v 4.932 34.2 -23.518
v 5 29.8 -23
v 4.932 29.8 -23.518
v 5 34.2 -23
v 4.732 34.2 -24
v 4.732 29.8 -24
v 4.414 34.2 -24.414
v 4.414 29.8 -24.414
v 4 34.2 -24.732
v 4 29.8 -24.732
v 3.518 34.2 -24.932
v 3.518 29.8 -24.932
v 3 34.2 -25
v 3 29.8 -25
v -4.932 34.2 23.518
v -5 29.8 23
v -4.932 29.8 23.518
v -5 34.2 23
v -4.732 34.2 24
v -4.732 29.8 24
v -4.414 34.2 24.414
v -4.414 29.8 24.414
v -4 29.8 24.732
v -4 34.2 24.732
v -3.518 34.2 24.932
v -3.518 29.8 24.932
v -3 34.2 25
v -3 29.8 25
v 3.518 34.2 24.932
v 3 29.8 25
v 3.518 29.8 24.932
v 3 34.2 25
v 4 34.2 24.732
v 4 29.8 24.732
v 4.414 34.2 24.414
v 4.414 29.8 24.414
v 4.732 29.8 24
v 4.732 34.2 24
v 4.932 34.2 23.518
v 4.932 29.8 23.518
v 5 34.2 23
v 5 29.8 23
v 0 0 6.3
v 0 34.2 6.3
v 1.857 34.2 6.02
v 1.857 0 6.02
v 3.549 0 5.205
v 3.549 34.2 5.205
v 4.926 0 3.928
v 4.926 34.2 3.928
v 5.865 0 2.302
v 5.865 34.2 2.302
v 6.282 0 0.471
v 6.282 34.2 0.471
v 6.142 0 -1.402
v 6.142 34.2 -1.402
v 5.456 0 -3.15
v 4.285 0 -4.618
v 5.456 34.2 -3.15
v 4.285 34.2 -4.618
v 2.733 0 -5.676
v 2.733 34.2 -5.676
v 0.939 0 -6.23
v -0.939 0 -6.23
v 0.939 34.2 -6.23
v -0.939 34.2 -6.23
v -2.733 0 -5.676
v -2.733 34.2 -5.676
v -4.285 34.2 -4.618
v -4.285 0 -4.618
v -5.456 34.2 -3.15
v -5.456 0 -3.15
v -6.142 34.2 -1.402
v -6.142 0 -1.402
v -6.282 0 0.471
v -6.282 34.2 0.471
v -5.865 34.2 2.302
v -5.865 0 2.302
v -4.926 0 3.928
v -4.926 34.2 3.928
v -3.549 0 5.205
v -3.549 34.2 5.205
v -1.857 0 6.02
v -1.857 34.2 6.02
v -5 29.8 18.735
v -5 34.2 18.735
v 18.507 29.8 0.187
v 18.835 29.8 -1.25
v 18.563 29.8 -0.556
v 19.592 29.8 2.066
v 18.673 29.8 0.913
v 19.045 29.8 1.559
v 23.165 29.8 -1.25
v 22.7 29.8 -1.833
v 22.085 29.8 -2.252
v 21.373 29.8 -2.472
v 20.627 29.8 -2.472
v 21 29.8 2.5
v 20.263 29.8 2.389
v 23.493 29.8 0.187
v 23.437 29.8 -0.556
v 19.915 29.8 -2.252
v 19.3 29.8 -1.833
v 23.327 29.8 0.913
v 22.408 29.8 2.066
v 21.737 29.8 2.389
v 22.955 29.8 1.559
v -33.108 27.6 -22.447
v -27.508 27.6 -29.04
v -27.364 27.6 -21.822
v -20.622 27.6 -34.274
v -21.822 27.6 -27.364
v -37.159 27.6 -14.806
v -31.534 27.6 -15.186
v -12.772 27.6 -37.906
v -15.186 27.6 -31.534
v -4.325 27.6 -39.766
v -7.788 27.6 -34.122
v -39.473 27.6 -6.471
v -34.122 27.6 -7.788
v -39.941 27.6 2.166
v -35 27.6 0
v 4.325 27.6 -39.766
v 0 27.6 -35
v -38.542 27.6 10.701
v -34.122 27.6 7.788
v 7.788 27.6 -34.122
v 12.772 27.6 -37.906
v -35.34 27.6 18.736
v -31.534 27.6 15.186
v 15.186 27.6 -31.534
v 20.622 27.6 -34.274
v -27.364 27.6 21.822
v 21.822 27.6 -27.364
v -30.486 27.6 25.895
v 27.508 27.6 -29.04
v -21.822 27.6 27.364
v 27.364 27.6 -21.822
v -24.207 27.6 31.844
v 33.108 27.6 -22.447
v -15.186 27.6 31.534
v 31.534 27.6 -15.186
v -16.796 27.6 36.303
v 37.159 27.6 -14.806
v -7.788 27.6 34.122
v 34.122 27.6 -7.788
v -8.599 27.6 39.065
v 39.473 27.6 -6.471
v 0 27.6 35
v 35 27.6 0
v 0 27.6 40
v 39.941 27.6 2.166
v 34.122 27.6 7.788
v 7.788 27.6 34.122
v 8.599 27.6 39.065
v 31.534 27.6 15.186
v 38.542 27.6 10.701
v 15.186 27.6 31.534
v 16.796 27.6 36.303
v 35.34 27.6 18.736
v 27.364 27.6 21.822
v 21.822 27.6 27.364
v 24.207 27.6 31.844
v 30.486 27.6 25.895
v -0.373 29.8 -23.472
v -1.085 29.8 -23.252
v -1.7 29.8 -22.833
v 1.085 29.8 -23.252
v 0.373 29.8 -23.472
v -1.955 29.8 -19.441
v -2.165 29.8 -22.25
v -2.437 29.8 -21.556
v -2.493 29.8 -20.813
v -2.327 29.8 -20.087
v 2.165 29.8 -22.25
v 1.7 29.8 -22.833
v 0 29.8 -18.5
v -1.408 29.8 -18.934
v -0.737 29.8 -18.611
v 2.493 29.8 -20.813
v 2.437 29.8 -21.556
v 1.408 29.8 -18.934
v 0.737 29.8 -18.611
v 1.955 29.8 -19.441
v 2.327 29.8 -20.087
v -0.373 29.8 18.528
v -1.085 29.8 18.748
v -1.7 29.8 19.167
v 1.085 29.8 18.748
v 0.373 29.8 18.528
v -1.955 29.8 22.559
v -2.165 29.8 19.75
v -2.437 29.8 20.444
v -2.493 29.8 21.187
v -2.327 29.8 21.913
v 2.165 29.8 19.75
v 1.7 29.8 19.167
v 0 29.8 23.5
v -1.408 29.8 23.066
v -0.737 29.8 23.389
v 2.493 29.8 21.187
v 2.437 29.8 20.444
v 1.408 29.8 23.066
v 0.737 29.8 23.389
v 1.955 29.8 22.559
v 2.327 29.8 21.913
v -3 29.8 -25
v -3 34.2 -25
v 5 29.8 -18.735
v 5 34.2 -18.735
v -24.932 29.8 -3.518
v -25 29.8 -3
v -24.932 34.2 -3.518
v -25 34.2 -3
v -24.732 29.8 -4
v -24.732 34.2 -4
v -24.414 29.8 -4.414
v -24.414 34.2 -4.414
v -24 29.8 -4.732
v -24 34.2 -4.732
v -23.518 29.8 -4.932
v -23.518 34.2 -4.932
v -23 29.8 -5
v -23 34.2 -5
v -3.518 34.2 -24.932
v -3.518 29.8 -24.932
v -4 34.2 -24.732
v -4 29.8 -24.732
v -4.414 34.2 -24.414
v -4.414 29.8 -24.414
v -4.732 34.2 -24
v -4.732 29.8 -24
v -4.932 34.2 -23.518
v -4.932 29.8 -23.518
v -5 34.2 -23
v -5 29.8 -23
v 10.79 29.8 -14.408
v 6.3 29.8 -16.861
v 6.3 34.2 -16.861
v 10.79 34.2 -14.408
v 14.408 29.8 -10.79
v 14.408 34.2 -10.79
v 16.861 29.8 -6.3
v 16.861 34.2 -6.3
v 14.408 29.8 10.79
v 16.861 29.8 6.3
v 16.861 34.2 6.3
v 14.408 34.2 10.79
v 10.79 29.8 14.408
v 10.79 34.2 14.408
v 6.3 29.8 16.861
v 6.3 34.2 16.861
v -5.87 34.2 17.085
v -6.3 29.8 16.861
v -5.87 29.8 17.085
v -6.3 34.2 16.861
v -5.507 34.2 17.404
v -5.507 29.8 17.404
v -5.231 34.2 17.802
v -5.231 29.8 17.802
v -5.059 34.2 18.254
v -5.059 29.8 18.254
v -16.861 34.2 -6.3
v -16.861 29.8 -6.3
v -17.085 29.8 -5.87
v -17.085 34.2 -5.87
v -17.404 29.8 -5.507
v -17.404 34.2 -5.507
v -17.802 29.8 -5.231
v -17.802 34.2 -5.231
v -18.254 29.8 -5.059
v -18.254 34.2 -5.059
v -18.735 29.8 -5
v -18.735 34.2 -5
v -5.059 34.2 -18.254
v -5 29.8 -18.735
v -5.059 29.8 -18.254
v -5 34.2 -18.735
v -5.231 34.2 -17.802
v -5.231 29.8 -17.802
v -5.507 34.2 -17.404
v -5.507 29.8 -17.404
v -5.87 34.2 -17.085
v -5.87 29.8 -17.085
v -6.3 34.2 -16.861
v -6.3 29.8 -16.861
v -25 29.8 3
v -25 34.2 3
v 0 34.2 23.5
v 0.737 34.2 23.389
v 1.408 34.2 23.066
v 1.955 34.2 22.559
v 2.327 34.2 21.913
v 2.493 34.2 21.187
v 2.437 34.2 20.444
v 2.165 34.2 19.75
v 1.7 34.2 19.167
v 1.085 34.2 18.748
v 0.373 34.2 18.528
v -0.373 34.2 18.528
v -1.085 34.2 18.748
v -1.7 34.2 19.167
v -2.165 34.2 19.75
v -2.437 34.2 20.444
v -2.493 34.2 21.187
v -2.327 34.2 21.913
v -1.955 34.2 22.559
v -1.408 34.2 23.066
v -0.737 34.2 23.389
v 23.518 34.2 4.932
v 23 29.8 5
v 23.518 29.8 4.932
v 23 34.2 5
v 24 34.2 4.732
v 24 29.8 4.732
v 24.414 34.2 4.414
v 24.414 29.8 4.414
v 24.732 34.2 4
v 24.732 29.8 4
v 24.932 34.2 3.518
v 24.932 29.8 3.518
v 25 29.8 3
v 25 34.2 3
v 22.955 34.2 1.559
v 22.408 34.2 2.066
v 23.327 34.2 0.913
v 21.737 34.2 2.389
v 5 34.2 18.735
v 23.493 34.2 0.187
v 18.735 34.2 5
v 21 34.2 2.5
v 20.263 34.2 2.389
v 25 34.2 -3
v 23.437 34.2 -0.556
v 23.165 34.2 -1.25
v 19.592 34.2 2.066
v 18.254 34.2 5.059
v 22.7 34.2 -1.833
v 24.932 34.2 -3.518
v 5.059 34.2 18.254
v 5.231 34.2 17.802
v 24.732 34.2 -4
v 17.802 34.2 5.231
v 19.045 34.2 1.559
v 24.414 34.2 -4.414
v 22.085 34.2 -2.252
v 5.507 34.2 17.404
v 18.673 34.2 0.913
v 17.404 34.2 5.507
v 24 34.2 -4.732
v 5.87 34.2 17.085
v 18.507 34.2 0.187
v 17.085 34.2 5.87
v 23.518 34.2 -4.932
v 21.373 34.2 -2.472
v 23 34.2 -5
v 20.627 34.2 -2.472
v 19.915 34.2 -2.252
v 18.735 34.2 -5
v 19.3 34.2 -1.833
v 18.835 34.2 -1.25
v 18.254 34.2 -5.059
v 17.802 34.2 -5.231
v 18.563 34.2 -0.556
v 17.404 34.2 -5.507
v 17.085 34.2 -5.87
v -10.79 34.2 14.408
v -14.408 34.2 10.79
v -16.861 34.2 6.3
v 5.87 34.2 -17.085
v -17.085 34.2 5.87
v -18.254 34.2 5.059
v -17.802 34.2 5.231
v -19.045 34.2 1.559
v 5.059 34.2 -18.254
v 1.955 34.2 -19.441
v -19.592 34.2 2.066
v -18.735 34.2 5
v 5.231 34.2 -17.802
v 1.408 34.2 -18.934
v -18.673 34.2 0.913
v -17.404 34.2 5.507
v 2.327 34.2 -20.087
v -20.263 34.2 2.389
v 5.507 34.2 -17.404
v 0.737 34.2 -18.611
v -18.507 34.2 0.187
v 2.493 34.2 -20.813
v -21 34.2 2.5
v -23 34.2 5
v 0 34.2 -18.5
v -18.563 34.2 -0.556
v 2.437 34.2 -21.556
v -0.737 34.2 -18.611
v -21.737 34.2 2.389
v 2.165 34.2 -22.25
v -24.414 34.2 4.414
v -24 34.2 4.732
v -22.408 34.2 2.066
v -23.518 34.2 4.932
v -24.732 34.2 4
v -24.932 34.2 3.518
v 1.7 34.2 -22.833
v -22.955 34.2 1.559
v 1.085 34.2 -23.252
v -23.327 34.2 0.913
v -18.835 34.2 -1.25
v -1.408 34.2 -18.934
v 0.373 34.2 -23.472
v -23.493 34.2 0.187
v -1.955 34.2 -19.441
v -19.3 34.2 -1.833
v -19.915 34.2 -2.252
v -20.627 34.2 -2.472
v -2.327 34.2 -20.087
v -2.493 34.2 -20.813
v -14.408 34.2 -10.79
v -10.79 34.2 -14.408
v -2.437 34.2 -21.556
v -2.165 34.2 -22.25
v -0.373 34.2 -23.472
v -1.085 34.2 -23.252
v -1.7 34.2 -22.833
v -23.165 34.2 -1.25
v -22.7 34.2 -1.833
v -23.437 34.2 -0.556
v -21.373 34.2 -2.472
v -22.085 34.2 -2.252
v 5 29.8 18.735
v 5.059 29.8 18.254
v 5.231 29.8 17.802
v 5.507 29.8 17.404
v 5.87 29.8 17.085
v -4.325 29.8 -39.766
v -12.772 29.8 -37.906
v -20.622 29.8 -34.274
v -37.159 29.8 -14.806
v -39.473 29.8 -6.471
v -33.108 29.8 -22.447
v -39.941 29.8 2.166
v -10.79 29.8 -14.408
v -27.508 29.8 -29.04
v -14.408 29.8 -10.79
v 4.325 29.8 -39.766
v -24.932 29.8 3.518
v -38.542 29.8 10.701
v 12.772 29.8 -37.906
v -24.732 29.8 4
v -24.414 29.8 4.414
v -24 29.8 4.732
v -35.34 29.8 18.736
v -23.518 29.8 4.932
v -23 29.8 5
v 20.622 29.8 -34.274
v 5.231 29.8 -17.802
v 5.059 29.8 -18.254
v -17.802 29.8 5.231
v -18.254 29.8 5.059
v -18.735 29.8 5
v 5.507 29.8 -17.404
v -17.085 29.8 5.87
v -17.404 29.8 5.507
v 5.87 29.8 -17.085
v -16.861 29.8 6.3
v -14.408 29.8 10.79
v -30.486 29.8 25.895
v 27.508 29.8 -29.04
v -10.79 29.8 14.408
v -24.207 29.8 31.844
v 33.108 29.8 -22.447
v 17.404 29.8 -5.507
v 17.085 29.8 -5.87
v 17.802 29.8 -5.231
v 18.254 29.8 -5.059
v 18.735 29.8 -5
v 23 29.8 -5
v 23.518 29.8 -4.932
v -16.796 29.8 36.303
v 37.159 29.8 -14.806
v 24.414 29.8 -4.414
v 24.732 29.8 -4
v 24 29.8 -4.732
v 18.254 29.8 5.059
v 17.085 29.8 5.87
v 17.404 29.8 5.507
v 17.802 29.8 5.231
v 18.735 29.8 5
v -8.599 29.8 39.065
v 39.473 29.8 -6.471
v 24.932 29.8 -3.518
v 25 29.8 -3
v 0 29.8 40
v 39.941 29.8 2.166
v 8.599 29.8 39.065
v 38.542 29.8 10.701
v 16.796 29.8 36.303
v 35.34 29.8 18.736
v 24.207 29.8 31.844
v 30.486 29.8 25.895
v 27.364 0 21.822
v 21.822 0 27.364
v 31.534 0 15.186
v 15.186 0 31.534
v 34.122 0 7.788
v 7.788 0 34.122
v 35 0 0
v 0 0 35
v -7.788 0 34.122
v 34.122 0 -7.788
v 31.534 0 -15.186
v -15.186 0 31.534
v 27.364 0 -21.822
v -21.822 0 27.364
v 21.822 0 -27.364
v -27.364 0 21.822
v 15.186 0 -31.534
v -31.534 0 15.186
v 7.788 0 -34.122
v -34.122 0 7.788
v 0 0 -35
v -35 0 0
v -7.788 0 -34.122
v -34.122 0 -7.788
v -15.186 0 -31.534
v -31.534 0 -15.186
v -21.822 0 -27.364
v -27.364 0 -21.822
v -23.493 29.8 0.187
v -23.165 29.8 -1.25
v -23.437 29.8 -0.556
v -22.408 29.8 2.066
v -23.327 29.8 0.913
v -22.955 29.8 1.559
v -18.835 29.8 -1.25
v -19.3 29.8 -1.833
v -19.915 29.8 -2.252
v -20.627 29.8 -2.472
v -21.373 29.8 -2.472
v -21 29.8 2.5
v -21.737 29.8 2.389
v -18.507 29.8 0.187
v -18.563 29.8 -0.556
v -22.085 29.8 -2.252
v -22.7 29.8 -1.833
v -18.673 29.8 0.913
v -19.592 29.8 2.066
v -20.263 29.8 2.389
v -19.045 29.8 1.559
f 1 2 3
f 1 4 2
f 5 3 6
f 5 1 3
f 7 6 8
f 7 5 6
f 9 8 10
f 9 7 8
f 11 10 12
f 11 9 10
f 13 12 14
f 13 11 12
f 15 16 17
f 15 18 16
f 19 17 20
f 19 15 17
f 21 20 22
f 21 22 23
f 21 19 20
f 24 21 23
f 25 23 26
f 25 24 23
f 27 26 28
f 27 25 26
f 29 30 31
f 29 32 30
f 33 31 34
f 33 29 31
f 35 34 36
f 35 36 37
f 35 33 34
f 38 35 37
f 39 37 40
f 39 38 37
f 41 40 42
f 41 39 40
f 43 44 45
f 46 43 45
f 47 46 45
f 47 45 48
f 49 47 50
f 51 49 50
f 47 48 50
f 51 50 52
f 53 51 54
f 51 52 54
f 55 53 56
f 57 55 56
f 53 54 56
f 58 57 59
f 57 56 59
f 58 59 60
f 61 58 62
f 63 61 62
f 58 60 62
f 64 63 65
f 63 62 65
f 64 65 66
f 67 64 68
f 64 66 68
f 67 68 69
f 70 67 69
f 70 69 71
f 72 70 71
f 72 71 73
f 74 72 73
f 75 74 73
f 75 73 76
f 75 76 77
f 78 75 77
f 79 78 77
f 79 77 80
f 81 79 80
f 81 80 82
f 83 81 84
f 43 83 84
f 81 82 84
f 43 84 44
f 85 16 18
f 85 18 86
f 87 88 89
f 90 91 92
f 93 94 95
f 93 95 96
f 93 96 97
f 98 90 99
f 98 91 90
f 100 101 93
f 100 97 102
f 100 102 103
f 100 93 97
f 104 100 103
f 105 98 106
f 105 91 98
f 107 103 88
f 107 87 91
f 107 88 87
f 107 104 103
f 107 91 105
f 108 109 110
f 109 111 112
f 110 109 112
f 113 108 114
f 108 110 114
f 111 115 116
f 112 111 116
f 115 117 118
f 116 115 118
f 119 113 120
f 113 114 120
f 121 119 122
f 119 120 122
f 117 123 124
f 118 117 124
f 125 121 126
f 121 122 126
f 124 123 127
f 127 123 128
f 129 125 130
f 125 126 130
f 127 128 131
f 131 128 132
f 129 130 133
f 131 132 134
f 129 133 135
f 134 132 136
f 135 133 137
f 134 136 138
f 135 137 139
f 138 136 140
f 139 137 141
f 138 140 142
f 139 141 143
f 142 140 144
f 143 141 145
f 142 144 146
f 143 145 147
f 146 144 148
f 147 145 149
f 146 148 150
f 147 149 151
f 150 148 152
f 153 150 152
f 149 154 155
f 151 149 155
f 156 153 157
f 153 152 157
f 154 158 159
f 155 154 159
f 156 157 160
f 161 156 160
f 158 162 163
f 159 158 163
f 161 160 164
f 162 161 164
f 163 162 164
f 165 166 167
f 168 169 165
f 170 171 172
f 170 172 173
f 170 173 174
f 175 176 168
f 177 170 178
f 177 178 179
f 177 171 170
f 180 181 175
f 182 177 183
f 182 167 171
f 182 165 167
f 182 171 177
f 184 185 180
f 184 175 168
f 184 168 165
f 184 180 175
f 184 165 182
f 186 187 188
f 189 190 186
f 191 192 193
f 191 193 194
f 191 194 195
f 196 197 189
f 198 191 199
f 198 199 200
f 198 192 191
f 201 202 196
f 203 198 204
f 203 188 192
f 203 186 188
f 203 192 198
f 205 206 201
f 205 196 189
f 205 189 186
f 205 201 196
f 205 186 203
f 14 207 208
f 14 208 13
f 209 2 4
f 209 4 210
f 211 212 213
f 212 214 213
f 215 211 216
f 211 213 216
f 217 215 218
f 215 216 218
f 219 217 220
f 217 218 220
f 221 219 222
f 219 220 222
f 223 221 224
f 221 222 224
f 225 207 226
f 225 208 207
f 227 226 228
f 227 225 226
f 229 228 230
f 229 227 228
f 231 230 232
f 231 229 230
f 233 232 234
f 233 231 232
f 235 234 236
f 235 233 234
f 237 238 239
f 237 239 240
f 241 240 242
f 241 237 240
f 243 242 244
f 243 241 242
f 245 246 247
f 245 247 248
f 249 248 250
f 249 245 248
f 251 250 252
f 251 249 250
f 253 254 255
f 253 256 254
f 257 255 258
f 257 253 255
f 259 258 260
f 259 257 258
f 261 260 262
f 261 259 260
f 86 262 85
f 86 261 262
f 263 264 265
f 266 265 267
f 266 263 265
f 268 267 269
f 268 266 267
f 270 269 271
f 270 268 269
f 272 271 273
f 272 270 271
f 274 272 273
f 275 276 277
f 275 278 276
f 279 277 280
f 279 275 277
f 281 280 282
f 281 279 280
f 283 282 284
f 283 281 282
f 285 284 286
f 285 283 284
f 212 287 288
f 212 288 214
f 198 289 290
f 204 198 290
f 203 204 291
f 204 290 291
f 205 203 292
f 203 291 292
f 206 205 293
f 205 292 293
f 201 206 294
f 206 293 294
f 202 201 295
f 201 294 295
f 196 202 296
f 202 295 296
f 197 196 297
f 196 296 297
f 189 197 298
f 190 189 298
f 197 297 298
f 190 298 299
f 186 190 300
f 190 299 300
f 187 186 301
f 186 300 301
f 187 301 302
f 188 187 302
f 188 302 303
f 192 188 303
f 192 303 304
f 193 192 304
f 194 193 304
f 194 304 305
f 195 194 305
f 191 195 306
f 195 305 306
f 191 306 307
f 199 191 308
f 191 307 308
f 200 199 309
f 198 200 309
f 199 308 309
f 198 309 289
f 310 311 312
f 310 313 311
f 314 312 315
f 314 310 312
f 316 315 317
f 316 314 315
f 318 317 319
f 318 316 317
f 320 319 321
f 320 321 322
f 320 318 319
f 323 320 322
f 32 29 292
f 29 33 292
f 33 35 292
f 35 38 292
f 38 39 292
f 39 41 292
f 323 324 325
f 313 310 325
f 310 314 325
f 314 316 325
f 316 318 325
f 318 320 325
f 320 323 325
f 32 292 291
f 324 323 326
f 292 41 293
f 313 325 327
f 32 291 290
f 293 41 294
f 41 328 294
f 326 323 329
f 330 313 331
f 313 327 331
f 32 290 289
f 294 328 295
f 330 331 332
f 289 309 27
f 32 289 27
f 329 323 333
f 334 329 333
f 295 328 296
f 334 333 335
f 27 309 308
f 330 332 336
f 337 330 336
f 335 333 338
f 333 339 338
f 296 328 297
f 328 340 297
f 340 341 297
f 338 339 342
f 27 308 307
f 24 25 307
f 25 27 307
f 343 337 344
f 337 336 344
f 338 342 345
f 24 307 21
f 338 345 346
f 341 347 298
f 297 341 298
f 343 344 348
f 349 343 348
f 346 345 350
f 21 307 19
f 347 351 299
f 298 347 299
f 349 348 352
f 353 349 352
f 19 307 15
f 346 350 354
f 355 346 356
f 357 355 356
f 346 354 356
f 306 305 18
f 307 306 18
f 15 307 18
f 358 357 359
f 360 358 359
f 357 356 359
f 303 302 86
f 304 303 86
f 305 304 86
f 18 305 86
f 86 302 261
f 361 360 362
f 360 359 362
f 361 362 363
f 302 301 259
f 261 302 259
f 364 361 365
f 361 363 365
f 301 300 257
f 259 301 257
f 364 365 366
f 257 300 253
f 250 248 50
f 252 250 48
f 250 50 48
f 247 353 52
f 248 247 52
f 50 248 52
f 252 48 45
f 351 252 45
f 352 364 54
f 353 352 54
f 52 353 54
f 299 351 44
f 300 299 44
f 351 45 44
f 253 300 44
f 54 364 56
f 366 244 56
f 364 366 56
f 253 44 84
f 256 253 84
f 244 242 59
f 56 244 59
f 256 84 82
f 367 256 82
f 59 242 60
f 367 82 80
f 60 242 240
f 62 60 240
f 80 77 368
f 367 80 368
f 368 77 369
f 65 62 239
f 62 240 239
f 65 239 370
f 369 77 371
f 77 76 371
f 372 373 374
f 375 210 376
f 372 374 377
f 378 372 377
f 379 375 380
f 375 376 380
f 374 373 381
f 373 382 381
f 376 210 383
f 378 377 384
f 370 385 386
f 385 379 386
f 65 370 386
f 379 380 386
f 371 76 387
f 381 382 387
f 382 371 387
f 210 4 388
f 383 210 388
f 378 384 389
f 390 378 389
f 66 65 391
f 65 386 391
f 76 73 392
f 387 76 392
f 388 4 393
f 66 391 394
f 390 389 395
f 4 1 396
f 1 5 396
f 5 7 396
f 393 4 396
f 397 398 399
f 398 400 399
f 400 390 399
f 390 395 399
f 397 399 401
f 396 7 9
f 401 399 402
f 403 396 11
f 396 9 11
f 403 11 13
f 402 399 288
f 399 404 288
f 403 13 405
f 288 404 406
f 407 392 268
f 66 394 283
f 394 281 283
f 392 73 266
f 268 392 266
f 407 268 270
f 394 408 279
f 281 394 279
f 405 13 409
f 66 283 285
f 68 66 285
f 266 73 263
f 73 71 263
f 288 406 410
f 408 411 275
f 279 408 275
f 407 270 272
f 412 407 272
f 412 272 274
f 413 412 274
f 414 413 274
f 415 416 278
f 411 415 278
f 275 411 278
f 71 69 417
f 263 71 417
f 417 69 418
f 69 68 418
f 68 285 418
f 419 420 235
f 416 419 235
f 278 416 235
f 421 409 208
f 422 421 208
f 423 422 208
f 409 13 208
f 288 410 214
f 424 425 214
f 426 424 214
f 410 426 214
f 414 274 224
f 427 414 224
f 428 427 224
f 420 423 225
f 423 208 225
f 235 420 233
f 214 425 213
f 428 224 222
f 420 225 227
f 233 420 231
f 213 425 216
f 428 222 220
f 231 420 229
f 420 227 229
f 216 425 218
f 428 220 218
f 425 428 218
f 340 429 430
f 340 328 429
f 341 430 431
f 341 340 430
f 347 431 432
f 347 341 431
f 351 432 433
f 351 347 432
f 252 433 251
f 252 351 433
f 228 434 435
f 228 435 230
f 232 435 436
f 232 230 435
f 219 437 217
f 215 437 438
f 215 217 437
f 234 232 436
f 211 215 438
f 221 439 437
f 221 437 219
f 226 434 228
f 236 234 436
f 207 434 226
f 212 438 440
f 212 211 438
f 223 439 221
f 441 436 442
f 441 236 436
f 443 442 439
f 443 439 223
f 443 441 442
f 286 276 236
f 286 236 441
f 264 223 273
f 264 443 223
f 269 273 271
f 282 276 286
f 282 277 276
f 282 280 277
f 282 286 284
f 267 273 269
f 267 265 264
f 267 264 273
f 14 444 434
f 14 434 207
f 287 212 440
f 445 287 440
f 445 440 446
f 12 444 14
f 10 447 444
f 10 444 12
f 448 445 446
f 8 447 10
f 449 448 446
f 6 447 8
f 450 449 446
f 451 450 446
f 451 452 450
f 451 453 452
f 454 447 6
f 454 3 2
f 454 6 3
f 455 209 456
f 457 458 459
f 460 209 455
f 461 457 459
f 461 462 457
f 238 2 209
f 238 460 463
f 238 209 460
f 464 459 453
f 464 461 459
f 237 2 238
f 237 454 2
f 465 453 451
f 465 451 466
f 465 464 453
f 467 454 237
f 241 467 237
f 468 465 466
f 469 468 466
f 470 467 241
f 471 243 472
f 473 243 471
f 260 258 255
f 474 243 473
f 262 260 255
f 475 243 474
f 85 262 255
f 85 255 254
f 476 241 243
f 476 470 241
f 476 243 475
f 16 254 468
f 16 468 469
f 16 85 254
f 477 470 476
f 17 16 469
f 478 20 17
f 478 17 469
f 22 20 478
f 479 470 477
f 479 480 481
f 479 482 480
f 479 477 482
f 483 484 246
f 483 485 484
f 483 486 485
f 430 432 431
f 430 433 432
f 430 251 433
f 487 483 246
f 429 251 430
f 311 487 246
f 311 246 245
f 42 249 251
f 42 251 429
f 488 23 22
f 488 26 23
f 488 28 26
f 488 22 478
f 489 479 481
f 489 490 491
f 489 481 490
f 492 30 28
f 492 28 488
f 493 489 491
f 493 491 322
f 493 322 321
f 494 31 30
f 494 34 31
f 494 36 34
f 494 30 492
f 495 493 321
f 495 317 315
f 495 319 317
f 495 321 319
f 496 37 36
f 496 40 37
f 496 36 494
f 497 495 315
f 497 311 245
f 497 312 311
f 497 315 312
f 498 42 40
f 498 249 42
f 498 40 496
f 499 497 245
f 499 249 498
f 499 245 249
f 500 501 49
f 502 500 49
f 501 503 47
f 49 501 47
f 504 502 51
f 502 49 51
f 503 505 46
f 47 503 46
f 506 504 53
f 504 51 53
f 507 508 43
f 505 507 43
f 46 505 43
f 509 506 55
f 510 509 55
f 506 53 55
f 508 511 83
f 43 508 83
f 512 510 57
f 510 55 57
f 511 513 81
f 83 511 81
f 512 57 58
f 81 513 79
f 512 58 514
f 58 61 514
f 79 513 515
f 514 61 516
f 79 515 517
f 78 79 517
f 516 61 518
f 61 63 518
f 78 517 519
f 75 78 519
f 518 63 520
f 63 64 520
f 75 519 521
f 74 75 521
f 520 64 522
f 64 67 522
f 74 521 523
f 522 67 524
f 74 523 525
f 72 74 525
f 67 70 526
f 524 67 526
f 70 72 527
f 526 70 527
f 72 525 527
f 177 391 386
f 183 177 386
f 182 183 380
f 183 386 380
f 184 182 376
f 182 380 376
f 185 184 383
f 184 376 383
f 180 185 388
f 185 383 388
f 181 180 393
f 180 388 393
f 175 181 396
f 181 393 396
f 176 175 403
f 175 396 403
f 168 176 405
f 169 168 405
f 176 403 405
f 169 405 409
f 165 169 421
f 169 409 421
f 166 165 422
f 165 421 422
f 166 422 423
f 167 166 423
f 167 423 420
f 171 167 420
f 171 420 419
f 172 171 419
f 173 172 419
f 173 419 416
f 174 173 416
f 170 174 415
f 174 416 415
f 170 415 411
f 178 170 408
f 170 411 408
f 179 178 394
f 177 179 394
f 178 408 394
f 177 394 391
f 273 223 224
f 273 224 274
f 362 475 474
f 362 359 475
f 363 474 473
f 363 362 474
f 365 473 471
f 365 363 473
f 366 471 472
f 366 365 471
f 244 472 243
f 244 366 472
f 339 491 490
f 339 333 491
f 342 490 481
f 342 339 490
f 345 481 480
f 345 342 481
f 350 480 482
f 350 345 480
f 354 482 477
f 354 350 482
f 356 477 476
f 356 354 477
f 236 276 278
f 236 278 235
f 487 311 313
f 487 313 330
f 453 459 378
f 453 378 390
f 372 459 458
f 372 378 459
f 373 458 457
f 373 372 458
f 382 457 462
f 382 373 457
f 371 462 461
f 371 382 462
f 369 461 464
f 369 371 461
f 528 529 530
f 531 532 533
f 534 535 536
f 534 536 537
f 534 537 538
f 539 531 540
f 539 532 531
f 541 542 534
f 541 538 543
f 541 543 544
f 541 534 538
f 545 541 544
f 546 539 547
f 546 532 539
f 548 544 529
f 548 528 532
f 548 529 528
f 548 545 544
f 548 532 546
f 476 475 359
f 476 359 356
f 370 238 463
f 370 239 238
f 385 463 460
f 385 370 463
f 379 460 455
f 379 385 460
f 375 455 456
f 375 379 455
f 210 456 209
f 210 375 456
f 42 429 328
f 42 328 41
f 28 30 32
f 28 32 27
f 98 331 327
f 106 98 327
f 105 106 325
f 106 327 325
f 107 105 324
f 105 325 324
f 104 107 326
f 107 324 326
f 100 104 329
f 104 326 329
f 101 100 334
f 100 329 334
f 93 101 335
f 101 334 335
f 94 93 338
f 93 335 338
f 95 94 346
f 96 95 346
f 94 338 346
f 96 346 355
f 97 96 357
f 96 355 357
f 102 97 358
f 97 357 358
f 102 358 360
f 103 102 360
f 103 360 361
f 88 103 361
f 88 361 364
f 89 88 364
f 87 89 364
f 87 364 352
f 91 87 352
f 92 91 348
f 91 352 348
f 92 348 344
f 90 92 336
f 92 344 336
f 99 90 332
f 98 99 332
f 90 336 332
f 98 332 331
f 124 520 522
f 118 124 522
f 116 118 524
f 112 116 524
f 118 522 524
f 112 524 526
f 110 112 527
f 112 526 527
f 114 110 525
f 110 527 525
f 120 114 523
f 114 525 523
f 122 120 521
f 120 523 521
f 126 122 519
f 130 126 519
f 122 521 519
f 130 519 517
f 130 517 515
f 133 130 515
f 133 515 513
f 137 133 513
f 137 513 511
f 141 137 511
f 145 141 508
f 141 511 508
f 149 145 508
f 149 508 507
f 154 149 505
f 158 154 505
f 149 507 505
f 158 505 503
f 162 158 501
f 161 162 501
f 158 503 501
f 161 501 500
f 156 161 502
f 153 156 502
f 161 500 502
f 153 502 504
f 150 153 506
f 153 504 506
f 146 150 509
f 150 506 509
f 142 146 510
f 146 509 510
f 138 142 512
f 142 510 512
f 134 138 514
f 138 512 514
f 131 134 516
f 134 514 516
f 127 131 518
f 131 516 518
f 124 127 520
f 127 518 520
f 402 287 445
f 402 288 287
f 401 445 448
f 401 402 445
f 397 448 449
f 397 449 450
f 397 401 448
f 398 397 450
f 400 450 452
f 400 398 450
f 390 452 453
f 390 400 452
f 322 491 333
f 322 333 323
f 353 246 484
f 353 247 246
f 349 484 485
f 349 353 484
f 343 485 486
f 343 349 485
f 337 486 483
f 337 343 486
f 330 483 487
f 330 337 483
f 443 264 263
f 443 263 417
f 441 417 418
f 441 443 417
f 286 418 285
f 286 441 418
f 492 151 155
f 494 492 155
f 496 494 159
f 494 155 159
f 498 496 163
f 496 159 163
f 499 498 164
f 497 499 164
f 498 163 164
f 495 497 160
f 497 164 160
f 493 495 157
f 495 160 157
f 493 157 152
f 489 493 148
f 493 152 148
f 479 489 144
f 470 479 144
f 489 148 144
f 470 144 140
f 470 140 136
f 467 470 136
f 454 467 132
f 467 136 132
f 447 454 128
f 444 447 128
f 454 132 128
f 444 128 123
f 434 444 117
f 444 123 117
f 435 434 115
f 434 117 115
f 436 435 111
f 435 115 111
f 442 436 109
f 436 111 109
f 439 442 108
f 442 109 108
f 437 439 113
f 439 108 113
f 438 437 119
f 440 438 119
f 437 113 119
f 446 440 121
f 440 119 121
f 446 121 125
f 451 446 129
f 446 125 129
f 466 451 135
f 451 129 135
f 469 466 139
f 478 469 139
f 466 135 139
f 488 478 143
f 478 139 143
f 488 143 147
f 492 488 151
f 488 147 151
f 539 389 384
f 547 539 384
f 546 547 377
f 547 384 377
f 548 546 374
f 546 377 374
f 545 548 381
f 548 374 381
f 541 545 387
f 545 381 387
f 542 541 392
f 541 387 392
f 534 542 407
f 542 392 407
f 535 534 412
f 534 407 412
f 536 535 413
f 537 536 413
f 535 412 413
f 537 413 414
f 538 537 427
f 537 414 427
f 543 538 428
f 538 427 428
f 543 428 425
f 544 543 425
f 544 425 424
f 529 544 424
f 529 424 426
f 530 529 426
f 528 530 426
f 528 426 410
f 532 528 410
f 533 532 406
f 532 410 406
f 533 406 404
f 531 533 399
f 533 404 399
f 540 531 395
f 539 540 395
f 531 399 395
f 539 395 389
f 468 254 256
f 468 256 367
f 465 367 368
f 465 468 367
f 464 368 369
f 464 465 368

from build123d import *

# Parameters (mm, degrees)
SKETCH1_R           = 35
BOSS_EXTRUDE1_DEPTH = 27.6
SKETCH2_R           = 40
BOSS_EXTRUDE2_DEPTH = 2.2
BOSS_EXTRUDE3_DEPTH = 4.4
FILLET3_R           = 2
SKETCH4_R           = 6.3
CUT_EXTRUDE1_DEPTH  = 34.2
SKETCH5_R           = 2.5
CUT_EXTRUDE2_DEPTH  = 4.4


with BuildPart() as part:
    # Sketch1 → Boss-Extrude1 (new body)
    with BuildSketch(Plane(origin=(0, 0, 0), x_dir=(1, 0, 0), z_dir=(0, 1, 0))):
        with Locations(Location((0, 0, 0), (0, 0, 90))):
            Circle(SKETCH1_R)
    extrude(amount=BOSS_EXTRUDE1_DEPTH)

    # Sketch2 → Boss-Extrude2 (add)
    with BuildSketch(Plane(origin=(0, 27.6, 0), x_dir=(1, 0, 0), z_dir=(0, 1, 0))):
        with Locations(Location((0, 0, 0), (0, 0, 270))):
            Circle(SKETCH2_R)
    extrude(amount=BOSS_EXTRUDE2_DEPTH)

    # Sketch3 → Boss-Extrude3 (add)
    with BuildSketch(Plane(origin=(0, 29.8, 0), x_dir=(1, 0, 0), z_dir=(0, 1, 0))):
        with BuildLine():
            Line((-25, 5), (-17.291616466, 5))
            ThreePointArc((-17.291616466, 5), (-12.727922061, 12.727922061), (-5, 17.291616466))
            Line((-5, 17.291616466), (-5, 25))
            Line((-5, 25), (5, 25))
            Line((5, 25), (5, 17.291616466))
            ThreePointArc((5, 17.291616466), (12.727922061, 12.727922061), (17.291616466, 5))
            Line((17.291616466, 5), (25, 5))
            Line((25, 5), (25, -5))
            Line((25, -5), (17.291616466, -5))
            ThreePointArc((17.291616466, -5), (12.727922061, -12.727922061), (5, -17.291616466))
            Line((5, -17.291616466), (5, -25))
            Line((5, -25), (-5, -25))
            Line((-5, -25), (-5, -17.291616466))
            ThreePointArc((-5, -17.291616466), (-12.727922061, -12.727922061), (-17.291616466, -5))
            Line((-17.291616466, -5), (-25, -5))
            Line((-25, -5), (-25, 5))
        make_face()
    extrude(amount=BOSS_EXTRUDE3_DEPTH)

    # Fillet3
    fillet3_edges = [part.edges().sort_by_distance(p)[0] for p in [
        (-25, 32, -5),
        (-25, 32, 5),
        (-17.291616466, 32, 5),
        (-5, 32, 17.291616466),
        (-5, 32, 25),
        (5, 32, 25),
        (5, 32, 17.291616466),
        (17.291616466, 32, 5),
        (25, 32, 5),
        (25, 32, -5),
        (17.291616466, 32, -5),
        (5, 32, -17.291616466),
        (5, 32, -25),
        (-5, 32, -25),
        (-5, 32, -17.291616466),
        (-17.291616466, 32, -5),
    ]]
    fillet(fillet3_edges, radius=FILLET3_R)

    # Sketch4 → Cut-Extrude1 (cut)
    with BuildSketch(Plane(origin=(0, 34.2, 0), x_dir=(1, 0, 0), z_dir=(0, 1, 0))):
        with Locations(Location((0, 0, 0), (0, 0, 270))):
            Circle(SKETCH4_R)
    extrude(amount=-CUT_EXTRUDE1_DEPTH, mode=Mode.SUBTRACT)

    # Sketch5 → Cut-Extrude2 (cut)
    with BuildSketch(Plane(origin=(0, 34.2, 0), x_dir=(1, 0, 0), z_dir=(0, 1, 0))):
        with Locations(Location((21, 0, 0), (0, 0, 270))):
            Circle(SKETCH5_R)
        with Locations(Location((0, -21, 0), (0, 0, 270))):
            Circle(SKETCH5_R)
        with Locations(Location((-21, 0, 0), (0, 0, 270))):
            Circle(SKETCH5_R)
        with Locations(Location((0, 21, 0), (0, 0, 270))):
            Circle(SKETCH5_R)
    extrude(amount=-CUT_EXTRUDE2_DEPTH, mode=Mode.SUBTRACT)


solid = part.part
